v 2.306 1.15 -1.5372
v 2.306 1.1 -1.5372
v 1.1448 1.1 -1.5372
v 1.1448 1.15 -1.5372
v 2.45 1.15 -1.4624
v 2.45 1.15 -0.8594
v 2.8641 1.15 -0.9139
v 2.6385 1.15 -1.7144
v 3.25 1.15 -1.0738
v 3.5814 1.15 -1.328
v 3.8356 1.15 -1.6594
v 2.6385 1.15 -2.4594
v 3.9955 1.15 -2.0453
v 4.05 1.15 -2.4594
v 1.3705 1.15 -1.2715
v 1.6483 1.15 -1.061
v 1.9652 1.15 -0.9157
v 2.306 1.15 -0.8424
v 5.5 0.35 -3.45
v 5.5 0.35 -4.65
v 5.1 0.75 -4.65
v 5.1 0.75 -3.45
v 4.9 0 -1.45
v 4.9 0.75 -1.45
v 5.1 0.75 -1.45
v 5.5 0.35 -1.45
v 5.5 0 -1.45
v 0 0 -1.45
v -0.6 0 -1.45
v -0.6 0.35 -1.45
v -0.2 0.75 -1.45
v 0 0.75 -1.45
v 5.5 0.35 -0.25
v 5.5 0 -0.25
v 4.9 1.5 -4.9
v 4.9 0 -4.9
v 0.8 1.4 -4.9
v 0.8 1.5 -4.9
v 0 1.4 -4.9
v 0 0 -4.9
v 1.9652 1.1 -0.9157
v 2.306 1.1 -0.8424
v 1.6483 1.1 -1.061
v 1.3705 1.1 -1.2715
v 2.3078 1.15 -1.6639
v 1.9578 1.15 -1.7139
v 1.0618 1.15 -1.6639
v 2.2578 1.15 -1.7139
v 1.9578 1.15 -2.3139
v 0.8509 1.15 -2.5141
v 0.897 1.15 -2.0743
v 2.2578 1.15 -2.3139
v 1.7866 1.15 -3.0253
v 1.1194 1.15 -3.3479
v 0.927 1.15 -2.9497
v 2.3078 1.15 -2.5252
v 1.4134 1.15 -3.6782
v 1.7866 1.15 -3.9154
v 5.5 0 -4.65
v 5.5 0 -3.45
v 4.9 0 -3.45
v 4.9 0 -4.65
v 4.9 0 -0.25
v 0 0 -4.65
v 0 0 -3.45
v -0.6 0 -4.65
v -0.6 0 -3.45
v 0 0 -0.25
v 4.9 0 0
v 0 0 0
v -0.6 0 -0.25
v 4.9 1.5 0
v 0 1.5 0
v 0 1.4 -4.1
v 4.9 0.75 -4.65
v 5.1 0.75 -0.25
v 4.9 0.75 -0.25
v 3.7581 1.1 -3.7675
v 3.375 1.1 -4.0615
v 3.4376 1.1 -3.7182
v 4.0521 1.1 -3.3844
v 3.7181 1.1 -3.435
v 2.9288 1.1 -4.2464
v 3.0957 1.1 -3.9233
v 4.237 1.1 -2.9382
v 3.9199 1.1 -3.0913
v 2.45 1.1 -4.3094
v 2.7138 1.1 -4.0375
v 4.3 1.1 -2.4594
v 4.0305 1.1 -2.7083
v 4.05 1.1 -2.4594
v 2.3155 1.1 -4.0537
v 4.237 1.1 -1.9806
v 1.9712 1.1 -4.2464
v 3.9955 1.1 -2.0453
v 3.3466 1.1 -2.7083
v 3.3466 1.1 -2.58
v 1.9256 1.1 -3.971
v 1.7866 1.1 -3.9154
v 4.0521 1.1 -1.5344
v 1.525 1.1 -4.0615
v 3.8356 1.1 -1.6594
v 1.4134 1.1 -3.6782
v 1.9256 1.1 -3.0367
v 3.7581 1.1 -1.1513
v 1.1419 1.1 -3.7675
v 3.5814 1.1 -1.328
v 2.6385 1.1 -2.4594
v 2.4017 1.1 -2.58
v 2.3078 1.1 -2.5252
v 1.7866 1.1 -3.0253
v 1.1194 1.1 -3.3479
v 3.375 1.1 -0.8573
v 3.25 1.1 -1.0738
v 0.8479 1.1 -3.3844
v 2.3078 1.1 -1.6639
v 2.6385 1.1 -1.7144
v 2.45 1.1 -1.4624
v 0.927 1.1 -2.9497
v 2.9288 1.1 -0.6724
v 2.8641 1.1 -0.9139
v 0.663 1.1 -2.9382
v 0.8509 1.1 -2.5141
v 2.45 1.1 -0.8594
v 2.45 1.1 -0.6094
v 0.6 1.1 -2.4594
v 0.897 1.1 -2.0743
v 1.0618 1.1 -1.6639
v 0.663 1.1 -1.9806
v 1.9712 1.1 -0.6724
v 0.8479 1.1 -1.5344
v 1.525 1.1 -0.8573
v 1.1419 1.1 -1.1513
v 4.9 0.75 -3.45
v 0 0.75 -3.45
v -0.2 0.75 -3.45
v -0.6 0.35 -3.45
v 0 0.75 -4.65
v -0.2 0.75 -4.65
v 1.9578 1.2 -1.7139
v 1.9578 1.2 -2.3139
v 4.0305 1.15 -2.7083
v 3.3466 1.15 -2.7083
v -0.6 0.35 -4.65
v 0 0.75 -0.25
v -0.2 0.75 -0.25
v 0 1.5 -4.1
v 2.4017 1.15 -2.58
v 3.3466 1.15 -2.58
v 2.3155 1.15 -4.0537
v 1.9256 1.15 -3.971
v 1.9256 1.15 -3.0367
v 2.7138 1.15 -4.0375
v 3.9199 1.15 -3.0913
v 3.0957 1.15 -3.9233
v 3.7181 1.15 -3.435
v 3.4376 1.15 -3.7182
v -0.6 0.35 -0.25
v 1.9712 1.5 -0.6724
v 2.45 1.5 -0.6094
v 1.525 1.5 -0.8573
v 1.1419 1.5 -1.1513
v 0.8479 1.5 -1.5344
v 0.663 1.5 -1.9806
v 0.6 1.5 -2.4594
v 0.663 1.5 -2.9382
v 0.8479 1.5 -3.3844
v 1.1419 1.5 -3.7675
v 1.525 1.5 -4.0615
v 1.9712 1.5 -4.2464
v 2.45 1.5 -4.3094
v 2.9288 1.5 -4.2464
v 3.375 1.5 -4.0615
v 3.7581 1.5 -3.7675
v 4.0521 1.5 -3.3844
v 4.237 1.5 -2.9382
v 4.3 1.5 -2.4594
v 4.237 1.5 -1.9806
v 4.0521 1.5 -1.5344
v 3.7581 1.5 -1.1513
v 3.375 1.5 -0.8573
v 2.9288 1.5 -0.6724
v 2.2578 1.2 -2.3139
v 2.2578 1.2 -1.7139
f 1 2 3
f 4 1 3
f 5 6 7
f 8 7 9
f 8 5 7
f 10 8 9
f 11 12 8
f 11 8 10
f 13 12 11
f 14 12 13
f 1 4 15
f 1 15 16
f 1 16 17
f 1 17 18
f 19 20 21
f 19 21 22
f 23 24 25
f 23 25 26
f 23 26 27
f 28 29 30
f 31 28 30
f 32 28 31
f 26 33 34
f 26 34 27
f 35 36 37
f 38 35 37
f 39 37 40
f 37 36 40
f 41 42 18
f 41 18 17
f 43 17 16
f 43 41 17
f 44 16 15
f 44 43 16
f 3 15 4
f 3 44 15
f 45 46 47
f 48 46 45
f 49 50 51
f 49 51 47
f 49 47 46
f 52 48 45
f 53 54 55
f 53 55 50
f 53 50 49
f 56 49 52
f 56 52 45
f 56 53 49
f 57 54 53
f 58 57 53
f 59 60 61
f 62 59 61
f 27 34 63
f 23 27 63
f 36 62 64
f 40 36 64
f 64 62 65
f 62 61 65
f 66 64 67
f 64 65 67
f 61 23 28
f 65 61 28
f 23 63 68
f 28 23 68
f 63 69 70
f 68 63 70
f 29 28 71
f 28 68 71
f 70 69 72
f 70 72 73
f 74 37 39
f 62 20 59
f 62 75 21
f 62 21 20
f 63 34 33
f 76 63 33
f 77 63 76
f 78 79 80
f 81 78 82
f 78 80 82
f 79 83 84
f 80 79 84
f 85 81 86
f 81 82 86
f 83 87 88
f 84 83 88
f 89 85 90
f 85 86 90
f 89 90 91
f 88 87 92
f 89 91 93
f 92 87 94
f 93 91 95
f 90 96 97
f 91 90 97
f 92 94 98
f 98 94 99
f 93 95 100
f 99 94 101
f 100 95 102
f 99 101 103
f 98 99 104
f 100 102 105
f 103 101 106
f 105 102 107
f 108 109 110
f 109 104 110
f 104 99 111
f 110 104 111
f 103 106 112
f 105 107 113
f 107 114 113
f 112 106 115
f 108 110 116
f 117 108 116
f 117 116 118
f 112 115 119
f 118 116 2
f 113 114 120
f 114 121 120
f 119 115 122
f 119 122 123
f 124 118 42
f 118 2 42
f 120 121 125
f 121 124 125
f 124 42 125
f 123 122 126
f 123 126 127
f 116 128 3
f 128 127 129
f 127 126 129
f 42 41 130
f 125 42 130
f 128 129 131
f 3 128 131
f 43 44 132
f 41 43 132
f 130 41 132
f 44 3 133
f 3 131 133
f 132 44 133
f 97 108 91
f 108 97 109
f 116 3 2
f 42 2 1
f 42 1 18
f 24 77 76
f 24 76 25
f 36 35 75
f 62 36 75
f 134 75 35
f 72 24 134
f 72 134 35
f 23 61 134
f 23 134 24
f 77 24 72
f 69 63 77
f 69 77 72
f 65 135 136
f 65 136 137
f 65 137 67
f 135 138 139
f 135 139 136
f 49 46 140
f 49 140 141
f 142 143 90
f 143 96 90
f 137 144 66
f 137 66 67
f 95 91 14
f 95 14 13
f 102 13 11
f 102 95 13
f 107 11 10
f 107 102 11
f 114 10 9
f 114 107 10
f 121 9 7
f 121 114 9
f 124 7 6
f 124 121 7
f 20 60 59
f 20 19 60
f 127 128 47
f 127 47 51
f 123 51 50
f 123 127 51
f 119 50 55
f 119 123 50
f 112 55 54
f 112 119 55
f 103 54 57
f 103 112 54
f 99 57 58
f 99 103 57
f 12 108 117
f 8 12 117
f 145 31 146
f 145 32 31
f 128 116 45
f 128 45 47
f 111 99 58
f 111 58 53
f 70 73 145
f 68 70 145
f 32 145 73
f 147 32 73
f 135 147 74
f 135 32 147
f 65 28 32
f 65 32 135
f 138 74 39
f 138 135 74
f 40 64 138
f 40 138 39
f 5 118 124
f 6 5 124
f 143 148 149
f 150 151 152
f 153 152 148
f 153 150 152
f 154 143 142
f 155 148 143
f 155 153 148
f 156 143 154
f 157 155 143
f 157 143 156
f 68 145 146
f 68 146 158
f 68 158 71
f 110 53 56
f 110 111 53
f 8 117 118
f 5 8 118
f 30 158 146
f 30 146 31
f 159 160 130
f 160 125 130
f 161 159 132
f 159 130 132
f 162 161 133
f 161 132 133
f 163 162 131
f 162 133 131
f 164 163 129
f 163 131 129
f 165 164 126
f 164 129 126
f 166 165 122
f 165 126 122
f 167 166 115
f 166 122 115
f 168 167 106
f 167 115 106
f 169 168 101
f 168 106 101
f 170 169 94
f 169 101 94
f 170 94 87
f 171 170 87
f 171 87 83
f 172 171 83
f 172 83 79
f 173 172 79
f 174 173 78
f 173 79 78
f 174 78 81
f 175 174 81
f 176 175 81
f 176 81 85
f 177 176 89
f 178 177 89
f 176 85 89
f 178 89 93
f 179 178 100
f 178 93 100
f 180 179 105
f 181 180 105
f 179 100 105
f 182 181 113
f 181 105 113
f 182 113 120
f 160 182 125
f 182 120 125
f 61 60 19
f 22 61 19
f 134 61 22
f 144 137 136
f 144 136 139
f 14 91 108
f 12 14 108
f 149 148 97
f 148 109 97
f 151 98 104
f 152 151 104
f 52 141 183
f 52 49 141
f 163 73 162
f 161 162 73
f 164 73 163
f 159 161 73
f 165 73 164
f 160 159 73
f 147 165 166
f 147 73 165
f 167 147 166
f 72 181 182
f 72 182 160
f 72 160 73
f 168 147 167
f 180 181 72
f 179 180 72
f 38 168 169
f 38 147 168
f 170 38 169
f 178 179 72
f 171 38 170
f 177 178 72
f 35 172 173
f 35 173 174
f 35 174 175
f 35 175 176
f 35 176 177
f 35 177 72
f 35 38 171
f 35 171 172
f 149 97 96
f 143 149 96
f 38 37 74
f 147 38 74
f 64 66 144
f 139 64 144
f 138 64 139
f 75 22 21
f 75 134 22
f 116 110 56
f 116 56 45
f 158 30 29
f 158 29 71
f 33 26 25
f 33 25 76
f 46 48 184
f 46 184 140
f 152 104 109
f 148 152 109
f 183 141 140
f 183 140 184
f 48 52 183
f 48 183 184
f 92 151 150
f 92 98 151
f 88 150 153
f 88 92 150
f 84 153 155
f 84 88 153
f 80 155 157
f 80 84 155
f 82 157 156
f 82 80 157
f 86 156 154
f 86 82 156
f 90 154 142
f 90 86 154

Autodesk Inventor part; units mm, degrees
ref_plane "YZ Plane" through (0, 0, 0) normal (1, 0, 0) x (0, 1, 0)
ref_plane "XZ Plane" through (0, 0, 0) normal (0, 1, 0) x (-1, 0, 0)
ref_plane "XY Plane" through (0, 0, 0) normal (0, 0, 1) x (1, 0, 0)
sketch "Esquisse1" plane through (0, 0, 0) normal (0, 1, 0) x (-1, 0, 0)
  line L0 (0, 0) -> (-4.9, 0)
  line L1 (-4.9, 0) -> (-4.9, -4.9)
  line L2 (-4.9, -4.9) -> (0, -4.9)
  line L3 (0, -4.9) -> (0, 0)
  dimension "d0" = 4.9
extrude "Extrusion1" add sketch "Esquisse1" along normal blind 1.4
sketch "Esquisse2" plane through (0, 0, -4.9) normal (-1, 0, 0) x (0, 0, 1)
  line L0 (0.25, 0.75) -> (1.45, 0.75)
  line L1 (1.45, 0.75) -> (1.45, 0)
  line L2 (1.45, 0) -> (0.25, 0)
  line L3 (0.25, 0) -> (0.25, 0.75)
  line L4 (0, 0) -> (0, 1.4) projected
  line L5 (0, 0) -> (4.9, 0) projected
  dimension "d4" = 1.2
  dimension "d5" = 0.75
  dimension "d8" = 0.25
  dimension "d9" = 0
extrude "Extrusion2" add sketch "Esquisse2" along normal blind 0.6
chamfer "Chanfrein1" distance 0.4 angle 45 1 edges at (-0.6, 0.75, -4.05)
sketch "Esquisse3" plane through (0, 0, 0) normal (-1, 0, 0) x (0, 0, 1)
  line L0 (-1.45, 0.75) -> (-0.25, 0.75)
  line L1 (-0.25, 0.75) -> (-0.25, 0)
  line L2 (-0.25, 0) -> (-1.45, 0)
  line L3 (-1.45, 0) -> (-1.45, 0.75)
  line L4 (-3.45, 0) -> (0, 0) projected
  line L5 (0, 0) -> (0, 1.4) projected
  dimension "d15" = 0
  dimension "d16" = 0.75
  dimension "d17" = 1.2
  dimension "d18" = 0.25
extrude "Extrusion3" add sketch "Esquisse3" along normal blind 0.6
chamfer "Chanfrein2" distance 0.4 angle 45 1 edges at (-0.6, 0.75, -0.85)
sketch "Esquisse4" plane through (4.9, 0, 0) normal (1, 0, 0) x (0, 0, -1)
  line L0 (0.25, 0.75) -> (1.45, 0.75)
  line L1 (1.45, 0.75) -> (1.45, 0)
  line L2 (1.45, 0) -> (0.25, 0)
  line L3 (0.25, 0) -> (0.25, 0.75)
  point P0 (0, 0)
  dimension "d24" = 0.75
  dimension "d25" = 1.2
  dimension "d26" = 0
  dimension "d27" = 0.25
extrude "Extrusion4" add sketch "Esquisse4" along normal blind 0.6
chamfer "Chanfrein3" distance 0.4 angle 45 1 edges at (5.5, 0.75, -0.85)
sketch "Esquisse5" plane through (4.9, 0, -4.9) normal (1, 0, 0) x (0, 0, -1)
  line L0 (-1.45, 0.75) -> (-0.25, 0.75)
  line L1 (-0.25, 0.75) -> (-0.25, 0)
  line L2 (-0.25, 0) -> (-1.45, 0)
  line L3 (-1.45, 0) -> (-1.45, 0.75)
  line L4 (-3.45, 0) -> (0, 0) projected
  line L5 (0, 0) -> (0, 1.4) projected
  point P0 (-4.9, 0)
  dimension "d33" = 1.2
  dimension "d34" = 0.75
  dimension "d35" = 0
  dimension "d36" = 0.25
extrude "Extrusion5" add sketch "Esquisse5" along normal blind 0.6
chamfer "Chanfrein4" distance 0.4 angle 45 1 edges at (5.5, 0.75, -4.05)
sketch "Esquisse8" plane through (0, 1.4, 0) normal (0, 1, 0) x (1, 0, 0)
  line L0 (4.9, 4.9) -> (0, 4.9) projected
  line L1 (0.8, 4.9) -> (4.9, 4.9)
  line L2 (4.9, 4.9) -> (4.9, 0)
  line L3 (4.9, 0) -> (0, 0)
  line L4 (0, 0) -> (0, 4.1)
  line L5 (0, 4.65) -> (0, 3.45) projected
  line L6 (0.8, 4.9) -> (0, 4.1)
  dimension "d44" = 0.8
  dimension "d45" = 0.8
extrude "Extrusion6" add sketch "Esquisse8" along normal blind 0.1
sketch "Esquisse9" plane through (0, 1.5, 0) normal (0, 1, 0) x (1, 0, 0)
  line L0 (4.9, 0) -> (4.9, 4.9) projected
  line L1 (4.9, 4.9) -> (0, 0) construction
  line L2 (4.9, 0) -> (0, 4.9187) construction
  circle A0 centre (2.45, 2.4594) radius 1.85
  dimension "d48" = 3.7
hole "Perçage1" at (2.45, 1.5, -2.4594) direction (0, -1, 0) diameter 3.7 depth 0.4
sketch "Esquisse10" plane through (2.45, 1.1, -2.4594) normal (0, 1, 0) x (1, 0, 0)
  circle A0 centre (0, 0) radius 1.6
  line L0 (1.6, 0) -> (0.1885, 0)
  line L1 (0.1885, 0) -> (0.1885, -0.745)
  line L2 (0.1885, -0.745) -> (0, -0.997)
  line L3 (0, -0.997) -> (0, -1.6)
  point P0 (-2.45, -2.4594)
  dimension "d56" = 3.2
extrude "Extrusion7" add sketch "Esquisse10" along normal blind 0.05 contours A0 L3 L2 L1 L0 picked at (0.6062, -0.4797)
sketch "Esquisse11" plane through (2.45, 1.1, -2.4594) normal (0, 1, 0) x (1, 0, 0)
  circle A0 centre (0, 0) radius 1.6
  line L0 (-0.5244, 1.5116) -> (-0.5244, 0.5773)
  line L1 (-0.5244, 0.5773) -> (-0.0483, 0.1206)
  line L2 (-0.0483, 0.1206) -> (0.8966, 0.1206)
  line L3 (0.8966, 0.1206) -> (0.8966, 0.2489)
  line L4 (0.8966, 0.2489) -> (1.5805, 0.2489)
  point P0 (-2.45, -2.4594)
  dimension "d59" = 3.2
extrude "Extrusion8" add sketch "Esquisse11" along normal blind 0.05 contours L4 L3 L2 L1 L0 A0 picked at (0.498, 0.6111)
sketch "Esquisse12" plane through (2.45, 1.1, -2.4594) normal (0, 1, 0) x (1, 0, 0)
  circle A0 centre (0, 0) radius 1.6
  line L0 (-0.6634, 1.456) -> (-0.6634, 0.5659)
  line L1 (-0.6634, 0.5659) -> (-0.1422, 0.0658)
  line L2 (-0.1422, 0.0658) -> (-0.1422, -0.7955)
  line L3 (-0.1422, -0.7955) -> (-1.3882, -0.7955)
  line L4 (-0.5244, 0.5773) -> (-0.0483, 0.1206) projected
  point P0 (-2.45, -2.4594)
extrude "Extrusion9" add sketch "Esquisse12" along normal blind 0.05 contours L0 L1 L2 L3 A0 picked at (-0.5575, -0.5084)
sketch "Esquisse13" plane through (2.45, 1.1, -2.4594) normal (0, 1, 0) x (1, 0, 0)
  circle A0 centre (0.0198, -0.0254) radius 1.6
  line L0 (-0.144, -0.9222) -> (-1.3052, -0.9222)
  line L1 (-0.144, -0.9222) -> (-0.144, -1.617)
  line L2 (-1.3882, -0.7955) -> (-0.1422, -0.7955) projected
  point P0 (-2.45, -2.4594)
extrude "Extrusion10" add sketch "Esquisse13" along normal blind 0.05 contours L0 L1 A0 picked at (-0.8429, -1.0108)
sketch "Esquisse14" plane through (2.45, 1.15, -2.4594) normal (0, 1, 0) x (1, 0, 0)
  line L0 (-0.1922, -0.7455) -> (-0.4922, -0.7455)
  line L1 (-0.4922, -0.7455) -> (-0.4922, -0.1455)
  line L2 (-0.4922, -0.1455) -> (-0.1922, -0.1455)
  line L3 (-0.1922, -0.1455) -> (-0.1922, -0.7455)
  line L4 (-1.3882, -0.7955) -> (-0.1422, -0.7955) projected
  line L5 (-0.1422, 0.0658) -> (-0.1422, -0.7955) projected
  point P0 (-2.45, -2.4594)
  dimension "d66" = 0.3
  dimension "d67" = 0.6
  dimension "d68" = 0.05
  dimension "d69" = 0.05
extrude "Extrusion11" add sketch "Esquisse14" along normal blind 0.05
properties part number "Nes_Led"
